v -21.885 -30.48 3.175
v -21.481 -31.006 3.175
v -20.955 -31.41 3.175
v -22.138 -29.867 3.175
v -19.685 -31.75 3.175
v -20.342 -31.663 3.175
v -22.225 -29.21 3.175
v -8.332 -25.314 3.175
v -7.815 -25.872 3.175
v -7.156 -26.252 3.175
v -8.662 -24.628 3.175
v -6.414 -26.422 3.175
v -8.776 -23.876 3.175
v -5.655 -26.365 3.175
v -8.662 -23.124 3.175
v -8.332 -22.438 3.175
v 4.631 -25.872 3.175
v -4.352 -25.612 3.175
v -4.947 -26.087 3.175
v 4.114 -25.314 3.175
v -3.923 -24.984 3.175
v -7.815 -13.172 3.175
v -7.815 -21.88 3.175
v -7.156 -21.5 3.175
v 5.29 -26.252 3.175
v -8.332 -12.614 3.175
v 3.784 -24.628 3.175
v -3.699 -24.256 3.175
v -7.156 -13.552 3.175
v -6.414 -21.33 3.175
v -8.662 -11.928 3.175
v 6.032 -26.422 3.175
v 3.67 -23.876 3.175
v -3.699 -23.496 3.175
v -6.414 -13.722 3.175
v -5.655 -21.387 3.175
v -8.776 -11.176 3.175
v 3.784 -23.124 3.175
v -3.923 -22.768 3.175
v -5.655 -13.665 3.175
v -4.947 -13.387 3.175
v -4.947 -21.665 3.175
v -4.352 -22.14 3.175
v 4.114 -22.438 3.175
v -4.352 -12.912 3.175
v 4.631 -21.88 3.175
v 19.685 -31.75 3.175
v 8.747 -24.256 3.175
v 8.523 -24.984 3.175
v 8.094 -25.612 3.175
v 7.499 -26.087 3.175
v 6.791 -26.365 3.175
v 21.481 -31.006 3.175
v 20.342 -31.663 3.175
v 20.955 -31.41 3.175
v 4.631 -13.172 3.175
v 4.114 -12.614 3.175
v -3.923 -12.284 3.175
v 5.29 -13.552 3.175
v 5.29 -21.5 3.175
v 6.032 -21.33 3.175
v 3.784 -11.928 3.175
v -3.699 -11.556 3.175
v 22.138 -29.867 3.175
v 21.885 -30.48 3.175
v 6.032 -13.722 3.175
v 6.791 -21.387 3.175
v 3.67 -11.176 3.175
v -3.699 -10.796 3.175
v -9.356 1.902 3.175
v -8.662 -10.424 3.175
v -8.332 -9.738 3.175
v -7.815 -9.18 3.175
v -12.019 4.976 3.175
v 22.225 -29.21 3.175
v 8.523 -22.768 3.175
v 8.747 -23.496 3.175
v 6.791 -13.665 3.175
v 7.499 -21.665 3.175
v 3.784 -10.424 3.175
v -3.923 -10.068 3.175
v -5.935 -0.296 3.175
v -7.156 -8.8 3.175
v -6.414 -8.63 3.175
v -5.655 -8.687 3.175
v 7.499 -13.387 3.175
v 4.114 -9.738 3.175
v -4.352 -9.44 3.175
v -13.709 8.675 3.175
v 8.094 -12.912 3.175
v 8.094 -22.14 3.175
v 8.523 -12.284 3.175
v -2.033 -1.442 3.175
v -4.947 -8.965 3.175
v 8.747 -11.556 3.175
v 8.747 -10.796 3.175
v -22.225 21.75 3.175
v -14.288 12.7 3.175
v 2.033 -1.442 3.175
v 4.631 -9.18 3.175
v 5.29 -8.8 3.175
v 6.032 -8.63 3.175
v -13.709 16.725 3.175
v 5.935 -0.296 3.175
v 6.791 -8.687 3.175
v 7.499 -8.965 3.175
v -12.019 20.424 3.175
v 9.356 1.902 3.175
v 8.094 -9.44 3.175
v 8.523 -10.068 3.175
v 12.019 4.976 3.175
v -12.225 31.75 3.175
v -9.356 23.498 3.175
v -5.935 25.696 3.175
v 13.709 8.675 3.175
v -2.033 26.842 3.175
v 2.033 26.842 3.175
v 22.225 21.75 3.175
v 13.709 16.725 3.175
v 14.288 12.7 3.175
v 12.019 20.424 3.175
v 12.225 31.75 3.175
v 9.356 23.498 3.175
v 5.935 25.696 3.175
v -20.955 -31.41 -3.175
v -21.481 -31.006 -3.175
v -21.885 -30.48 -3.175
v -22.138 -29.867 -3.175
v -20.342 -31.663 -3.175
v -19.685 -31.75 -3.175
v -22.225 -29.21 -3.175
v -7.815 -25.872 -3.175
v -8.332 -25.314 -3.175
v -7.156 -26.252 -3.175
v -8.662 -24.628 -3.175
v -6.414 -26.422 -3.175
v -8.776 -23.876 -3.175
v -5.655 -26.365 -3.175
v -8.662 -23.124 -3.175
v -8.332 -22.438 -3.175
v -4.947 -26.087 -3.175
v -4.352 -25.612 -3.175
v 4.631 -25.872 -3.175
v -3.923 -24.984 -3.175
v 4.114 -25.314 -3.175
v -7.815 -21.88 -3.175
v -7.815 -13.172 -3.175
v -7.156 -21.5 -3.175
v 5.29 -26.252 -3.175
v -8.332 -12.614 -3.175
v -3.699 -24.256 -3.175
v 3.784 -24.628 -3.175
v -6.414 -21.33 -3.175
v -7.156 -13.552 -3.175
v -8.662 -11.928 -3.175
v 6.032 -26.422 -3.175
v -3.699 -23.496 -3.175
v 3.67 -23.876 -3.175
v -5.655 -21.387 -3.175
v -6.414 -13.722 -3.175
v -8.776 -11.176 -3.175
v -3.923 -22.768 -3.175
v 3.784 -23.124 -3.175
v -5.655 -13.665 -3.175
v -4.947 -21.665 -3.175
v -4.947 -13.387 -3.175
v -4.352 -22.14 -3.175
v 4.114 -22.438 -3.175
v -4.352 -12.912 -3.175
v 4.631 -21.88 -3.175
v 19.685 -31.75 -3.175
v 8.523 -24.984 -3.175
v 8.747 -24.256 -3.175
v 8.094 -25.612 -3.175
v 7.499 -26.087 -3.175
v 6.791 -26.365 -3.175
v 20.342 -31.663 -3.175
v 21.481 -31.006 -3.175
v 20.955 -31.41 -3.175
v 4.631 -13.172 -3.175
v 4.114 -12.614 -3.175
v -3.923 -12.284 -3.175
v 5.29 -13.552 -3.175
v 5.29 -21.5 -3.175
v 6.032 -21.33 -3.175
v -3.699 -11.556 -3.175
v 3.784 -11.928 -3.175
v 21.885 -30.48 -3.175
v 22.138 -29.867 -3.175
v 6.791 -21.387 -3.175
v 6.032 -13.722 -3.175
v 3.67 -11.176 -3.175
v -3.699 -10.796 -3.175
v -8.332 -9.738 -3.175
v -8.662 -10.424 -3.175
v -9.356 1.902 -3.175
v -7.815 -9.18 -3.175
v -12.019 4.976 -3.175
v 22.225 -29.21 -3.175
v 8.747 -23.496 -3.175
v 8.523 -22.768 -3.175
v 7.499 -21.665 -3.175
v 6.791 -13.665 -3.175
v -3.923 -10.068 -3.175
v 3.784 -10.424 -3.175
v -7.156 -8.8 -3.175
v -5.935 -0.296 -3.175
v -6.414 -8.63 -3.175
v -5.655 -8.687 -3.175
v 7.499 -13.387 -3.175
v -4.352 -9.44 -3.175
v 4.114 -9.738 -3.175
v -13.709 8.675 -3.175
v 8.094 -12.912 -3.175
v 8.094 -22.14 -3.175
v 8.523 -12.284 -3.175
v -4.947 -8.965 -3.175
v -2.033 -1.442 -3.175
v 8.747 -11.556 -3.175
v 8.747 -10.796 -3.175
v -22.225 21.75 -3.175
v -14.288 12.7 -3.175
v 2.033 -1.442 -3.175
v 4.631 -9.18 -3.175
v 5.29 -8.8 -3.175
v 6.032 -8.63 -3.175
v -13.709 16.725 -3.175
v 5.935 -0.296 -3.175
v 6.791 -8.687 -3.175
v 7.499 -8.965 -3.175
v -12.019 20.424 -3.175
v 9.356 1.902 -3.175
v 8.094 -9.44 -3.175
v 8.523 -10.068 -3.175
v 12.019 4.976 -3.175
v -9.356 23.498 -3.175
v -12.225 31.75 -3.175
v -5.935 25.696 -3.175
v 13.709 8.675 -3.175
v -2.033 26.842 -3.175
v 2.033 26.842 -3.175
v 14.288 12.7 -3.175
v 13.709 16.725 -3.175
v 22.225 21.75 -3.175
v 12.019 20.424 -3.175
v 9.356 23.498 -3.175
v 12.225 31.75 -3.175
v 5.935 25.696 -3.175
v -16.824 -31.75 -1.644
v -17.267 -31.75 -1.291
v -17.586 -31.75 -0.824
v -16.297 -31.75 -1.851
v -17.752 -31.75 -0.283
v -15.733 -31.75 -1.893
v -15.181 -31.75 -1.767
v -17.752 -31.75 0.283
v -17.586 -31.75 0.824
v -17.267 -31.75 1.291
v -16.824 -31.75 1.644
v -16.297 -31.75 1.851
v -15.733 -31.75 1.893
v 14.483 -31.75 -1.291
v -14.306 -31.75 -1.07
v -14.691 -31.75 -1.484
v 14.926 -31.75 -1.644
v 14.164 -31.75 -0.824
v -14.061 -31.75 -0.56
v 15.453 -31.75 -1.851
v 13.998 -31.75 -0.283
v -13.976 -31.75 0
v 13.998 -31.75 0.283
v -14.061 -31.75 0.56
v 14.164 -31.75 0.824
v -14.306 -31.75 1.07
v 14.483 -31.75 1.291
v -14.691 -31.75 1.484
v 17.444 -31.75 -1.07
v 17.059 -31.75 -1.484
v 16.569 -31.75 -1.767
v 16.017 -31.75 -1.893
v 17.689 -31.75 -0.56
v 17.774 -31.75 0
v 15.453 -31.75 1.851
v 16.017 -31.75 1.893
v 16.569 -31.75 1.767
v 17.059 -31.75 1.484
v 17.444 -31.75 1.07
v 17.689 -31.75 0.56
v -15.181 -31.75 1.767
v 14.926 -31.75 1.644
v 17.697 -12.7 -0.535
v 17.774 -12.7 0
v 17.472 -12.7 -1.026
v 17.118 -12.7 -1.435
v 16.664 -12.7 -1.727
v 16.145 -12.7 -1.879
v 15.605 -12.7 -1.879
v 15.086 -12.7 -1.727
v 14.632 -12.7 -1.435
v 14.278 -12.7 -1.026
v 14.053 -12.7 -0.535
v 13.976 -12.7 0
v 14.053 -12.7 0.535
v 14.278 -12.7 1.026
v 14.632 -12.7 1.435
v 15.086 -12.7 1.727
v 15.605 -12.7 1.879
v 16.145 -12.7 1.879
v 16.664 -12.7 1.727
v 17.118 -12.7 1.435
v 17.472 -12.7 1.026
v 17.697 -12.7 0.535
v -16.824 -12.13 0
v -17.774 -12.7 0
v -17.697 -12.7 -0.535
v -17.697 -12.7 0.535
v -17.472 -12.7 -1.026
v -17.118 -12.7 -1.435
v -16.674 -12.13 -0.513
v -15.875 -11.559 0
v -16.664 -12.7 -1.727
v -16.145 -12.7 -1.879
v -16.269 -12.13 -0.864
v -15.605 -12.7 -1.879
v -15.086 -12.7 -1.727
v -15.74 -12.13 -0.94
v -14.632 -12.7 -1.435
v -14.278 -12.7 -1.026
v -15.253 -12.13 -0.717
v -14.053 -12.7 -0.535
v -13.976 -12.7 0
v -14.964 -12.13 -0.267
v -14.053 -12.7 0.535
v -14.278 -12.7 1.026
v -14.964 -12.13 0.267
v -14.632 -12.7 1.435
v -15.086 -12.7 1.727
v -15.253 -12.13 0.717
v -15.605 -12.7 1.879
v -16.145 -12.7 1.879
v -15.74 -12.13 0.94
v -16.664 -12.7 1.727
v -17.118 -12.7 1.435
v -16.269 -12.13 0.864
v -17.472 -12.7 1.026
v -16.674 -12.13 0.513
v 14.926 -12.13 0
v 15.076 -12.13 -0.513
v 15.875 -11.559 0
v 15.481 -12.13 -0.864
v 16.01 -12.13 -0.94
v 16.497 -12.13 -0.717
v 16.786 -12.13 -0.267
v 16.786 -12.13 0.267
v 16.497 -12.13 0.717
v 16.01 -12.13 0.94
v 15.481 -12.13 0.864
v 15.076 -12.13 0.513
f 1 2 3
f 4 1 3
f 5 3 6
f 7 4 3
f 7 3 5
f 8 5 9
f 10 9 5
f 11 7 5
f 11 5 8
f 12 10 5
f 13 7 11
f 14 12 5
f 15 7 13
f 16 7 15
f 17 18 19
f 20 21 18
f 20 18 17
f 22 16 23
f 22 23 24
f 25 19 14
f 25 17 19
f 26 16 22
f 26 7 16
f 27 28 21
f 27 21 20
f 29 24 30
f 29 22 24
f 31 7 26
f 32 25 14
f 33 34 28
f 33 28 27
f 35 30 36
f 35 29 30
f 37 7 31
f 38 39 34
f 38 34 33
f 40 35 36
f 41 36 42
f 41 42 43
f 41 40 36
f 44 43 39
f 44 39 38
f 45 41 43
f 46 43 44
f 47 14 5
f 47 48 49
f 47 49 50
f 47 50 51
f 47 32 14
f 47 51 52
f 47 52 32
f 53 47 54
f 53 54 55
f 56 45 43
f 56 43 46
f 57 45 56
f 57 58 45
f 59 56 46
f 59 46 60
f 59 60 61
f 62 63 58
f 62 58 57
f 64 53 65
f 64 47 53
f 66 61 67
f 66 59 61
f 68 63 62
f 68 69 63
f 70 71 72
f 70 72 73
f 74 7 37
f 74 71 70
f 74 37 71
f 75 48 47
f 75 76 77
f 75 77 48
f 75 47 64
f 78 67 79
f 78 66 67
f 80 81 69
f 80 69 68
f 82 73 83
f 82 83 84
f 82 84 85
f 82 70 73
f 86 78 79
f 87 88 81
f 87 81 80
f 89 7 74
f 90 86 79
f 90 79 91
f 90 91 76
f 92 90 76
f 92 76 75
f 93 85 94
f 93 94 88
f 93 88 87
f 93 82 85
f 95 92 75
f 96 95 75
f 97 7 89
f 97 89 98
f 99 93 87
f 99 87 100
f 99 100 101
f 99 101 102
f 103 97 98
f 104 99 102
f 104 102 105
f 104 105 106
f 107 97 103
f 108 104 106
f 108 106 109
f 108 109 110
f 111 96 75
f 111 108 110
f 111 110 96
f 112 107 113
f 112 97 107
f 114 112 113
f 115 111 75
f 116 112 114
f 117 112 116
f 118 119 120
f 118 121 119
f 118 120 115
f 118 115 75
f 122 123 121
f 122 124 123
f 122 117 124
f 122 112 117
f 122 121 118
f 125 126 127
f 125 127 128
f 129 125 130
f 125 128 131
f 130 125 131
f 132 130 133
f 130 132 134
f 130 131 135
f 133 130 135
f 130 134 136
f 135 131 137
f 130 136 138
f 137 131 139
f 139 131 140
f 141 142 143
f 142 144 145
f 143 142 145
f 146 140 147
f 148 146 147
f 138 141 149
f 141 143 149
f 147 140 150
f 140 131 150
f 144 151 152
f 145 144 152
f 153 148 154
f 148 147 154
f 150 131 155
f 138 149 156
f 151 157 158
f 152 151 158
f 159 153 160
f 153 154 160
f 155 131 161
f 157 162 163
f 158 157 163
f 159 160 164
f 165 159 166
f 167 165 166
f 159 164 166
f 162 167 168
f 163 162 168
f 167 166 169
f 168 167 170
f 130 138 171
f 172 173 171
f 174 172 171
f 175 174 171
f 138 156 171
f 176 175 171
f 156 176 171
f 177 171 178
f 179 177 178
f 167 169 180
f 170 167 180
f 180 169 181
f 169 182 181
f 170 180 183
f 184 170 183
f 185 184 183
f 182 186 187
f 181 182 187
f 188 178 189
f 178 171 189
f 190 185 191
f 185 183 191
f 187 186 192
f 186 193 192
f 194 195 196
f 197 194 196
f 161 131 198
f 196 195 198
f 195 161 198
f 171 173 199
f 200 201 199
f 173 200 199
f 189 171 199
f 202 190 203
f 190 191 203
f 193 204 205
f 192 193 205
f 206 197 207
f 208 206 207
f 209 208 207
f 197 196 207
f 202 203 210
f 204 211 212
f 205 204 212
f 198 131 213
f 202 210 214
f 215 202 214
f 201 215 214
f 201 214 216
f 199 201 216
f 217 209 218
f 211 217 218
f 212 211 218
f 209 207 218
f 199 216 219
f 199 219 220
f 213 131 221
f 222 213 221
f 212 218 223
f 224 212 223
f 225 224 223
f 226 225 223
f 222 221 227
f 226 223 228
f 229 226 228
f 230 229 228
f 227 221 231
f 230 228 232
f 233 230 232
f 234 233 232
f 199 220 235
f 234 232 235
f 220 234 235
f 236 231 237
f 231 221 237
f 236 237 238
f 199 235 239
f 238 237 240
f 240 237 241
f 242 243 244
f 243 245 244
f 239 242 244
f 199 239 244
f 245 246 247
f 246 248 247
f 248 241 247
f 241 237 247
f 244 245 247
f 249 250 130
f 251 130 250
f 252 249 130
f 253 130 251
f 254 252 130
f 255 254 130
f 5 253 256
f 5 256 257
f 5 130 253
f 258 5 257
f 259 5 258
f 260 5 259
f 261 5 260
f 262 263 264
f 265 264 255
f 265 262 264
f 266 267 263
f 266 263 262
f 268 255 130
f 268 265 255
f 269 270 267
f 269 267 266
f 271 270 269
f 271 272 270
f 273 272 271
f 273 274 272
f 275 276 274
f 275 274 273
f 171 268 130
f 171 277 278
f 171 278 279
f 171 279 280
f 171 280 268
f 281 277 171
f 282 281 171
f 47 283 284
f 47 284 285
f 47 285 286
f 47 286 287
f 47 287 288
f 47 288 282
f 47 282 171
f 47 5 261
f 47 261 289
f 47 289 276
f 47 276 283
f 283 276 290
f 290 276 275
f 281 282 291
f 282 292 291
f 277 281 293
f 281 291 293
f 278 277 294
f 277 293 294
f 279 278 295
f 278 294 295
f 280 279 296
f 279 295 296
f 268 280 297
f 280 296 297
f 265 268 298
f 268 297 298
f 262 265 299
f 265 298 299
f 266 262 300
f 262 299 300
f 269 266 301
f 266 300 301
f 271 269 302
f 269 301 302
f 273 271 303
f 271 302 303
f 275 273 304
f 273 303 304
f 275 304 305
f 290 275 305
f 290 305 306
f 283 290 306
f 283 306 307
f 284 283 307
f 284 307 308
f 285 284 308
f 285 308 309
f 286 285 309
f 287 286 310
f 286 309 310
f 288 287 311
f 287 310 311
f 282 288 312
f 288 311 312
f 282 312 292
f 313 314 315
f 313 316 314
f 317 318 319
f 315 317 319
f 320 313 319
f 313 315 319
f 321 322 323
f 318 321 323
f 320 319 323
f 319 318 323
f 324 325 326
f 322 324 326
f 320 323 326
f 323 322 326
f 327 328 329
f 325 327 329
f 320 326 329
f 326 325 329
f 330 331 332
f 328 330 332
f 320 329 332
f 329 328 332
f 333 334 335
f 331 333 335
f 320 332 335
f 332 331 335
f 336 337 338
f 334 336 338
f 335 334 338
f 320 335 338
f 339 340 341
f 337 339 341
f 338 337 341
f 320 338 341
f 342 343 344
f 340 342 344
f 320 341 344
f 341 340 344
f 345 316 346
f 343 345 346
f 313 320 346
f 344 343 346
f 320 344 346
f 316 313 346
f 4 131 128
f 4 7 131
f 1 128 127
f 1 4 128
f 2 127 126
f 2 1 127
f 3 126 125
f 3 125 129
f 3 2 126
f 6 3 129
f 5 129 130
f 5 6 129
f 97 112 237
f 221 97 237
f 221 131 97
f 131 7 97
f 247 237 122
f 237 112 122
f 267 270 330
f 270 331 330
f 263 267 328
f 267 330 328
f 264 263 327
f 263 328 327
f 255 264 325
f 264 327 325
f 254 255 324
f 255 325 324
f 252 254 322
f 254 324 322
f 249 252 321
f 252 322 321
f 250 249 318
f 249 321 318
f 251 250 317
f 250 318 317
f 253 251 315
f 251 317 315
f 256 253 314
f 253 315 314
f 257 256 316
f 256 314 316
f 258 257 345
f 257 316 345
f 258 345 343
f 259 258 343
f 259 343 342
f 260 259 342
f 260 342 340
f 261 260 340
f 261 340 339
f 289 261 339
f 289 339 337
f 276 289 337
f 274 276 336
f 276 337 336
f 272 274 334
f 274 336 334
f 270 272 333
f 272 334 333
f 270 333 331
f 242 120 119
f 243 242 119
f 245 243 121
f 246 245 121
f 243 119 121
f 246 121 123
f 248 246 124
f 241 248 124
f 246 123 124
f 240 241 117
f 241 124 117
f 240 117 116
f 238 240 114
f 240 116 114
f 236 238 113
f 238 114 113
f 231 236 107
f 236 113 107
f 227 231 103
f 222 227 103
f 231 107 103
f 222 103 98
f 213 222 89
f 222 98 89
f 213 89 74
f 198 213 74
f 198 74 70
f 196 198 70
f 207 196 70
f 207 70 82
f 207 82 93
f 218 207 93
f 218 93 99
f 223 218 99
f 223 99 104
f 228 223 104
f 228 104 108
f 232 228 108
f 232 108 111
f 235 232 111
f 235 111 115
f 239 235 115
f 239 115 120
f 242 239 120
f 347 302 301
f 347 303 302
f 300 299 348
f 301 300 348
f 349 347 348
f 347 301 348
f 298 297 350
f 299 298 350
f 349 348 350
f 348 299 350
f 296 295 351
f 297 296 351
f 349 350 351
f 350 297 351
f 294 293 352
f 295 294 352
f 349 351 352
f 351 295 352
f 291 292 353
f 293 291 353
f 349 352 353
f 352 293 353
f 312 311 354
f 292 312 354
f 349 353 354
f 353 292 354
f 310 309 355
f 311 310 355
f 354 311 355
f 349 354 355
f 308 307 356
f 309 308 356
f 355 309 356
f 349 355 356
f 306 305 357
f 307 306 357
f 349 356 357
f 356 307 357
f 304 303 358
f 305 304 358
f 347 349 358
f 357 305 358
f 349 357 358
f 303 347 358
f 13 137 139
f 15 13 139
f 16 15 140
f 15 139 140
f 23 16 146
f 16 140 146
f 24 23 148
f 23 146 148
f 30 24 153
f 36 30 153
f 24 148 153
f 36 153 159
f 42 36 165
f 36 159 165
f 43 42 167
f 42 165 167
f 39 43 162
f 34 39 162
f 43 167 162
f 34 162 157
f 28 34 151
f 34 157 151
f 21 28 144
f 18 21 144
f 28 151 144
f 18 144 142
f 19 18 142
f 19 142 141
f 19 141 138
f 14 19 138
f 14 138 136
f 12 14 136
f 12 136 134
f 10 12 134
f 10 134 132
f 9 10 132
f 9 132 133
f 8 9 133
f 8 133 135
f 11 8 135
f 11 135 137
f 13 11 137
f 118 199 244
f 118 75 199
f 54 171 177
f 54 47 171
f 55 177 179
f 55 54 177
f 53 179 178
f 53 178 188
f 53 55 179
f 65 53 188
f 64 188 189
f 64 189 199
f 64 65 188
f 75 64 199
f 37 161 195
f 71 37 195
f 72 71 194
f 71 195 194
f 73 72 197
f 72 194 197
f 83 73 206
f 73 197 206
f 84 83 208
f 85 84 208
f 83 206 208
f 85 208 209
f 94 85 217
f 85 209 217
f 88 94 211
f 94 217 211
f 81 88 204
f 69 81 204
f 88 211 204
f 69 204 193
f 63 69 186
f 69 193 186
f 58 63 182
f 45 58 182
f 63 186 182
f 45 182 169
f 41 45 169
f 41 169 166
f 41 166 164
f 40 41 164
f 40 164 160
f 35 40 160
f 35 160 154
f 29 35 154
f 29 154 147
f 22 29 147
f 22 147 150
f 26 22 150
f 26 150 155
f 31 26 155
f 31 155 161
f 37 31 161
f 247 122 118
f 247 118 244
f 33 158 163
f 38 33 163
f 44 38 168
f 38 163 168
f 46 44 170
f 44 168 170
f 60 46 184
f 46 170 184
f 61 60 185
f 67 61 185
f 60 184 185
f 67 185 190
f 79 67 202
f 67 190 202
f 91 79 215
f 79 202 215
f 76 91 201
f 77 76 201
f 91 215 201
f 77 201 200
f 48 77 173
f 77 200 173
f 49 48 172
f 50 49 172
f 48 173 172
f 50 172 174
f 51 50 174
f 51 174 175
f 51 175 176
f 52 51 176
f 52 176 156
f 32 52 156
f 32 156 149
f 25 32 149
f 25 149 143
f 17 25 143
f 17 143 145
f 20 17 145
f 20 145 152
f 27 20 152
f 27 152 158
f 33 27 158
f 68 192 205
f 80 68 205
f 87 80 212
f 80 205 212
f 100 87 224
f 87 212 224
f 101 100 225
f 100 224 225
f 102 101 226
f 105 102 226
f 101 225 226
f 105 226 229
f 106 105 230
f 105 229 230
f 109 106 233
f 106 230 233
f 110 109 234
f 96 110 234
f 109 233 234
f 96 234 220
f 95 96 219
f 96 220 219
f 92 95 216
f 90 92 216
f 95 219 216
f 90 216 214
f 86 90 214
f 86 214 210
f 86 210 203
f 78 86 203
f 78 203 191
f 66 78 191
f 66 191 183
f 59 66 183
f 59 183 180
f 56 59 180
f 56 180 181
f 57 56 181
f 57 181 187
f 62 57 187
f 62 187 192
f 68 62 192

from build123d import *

# Parameters (mm, degrees)
SKETCH1_W                      = 44.45
SKETCH1_H                      = 63.5
BOSS_EXTRUDE1_DEPTH            = 3.175
CHAMFER1_SIZE                  = 10
SKETCH2_R                      = 14.2875
CUT_EXTRUDE1_DEPTH             = 40.272581084
TAP_DRILL_FOR_10_24_TAP1_D     = 3.7973
TAP_DRILL_FOR_10_24_TAP1_DEPTH = 19.05
TAP_DRILL_FOR_10_24_TAP1_TIP   = 1.140824014
F_10_CLEARANCE_HOLE1_D         = 5.1054
F_10_CLEARANCE_HOLE1_DEPTH     = 12.7
F_10_CLEARANCE_HOLE1_TIP       = 1.533816902
FILLET1_R                      = 2.54


with BuildPart() as part:
    # Sketch1 → Boss-Extrude1 (new, symmetric)
    with BuildSketch(Plane.XY):
        Rectangle(SKETCH1_W, SKETCH1_H)
    extrude(amount=BOSS_EXTRUDE1_DEPTH, both=True)

    # Chamfer1
    chamfer1_edges = [part.edges().sort_by_distance(p)[0] for p in [
        (-22.225, 31.75, 0),
        (22.225, 31.75, 0),
    ]]
    chamfer(chamfer1_edges, length=CHAMFER1_SIZE)

    # Sketch2 → Cut-Extrude1 (cut, through all)
    with BuildSketch(Plane.XY.offset(3.175)):
        with Locations((0, 12.7)):
            Circle(SKETCH2_R)
    extrude(amount=-CUT_EXTRUDE1_DEPTH, mode=Mode.SUBTRACT)

    # Tap Drill for #10-24 Tap1
    with Locations(Plane(origin=(0, -31.75, 0), x_dir=(-1, 0, 0), z_dir=(0, -1, 0))):
        with Locations((15.875, 0), (-15.875, 0)):
            Hole(TAP_DRILL_FOR_10_24_TAP1_D / 2, depth=TAP_DRILL_FOR_10_24_TAP1_DEPTH)
            with Locations((0, 0, -(TAP_DRILL_FOR_10_24_TAP1_DEPTH + TAP_DRILL_FOR_10_24_TAP1_TIP / 2))):  # 118° drill point
                Cone(0, TAP_DRILL_FOR_10_24_TAP1_D / 2, TAP_DRILL_FOR_10_24_TAP1_TIP, mode=Mode.SUBTRACT)

    # #10 Clearance Hole1
    with Locations(Plane.XY.offset(3.175)):
        with Locations((-6.223, -11.176), (6.223, -11.176), (6.223, -23.876), (-6.223, -23.876)):
            Hole(F_10_CLEARANCE_HOLE1_D / 2, depth=F_10_CLEARANCE_HOLE1_DEPTH)
            with Locations((0, 0, -(F_10_CLEARANCE_HOLE1_DEPTH + F_10_CLEARANCE_HOLE1_TIP / 2))):  # 118° drill point
                Cone(0, F_10_CLEARANCE_HOLE1_D / 2, F_10_CLEARANCE_HOLE1_TIP, mode=Mode.SUBTRACT)

    # Fillet1
    fillet1_edges = [part.edges().sort_by_distance(p)[0] for p in [
        (22.225, -31.75, 0),
        (-22.225, -31.75, 0),
    ]]
    fillet(fillet1_edges, radius=FILLET1_R)


solid = part.part
